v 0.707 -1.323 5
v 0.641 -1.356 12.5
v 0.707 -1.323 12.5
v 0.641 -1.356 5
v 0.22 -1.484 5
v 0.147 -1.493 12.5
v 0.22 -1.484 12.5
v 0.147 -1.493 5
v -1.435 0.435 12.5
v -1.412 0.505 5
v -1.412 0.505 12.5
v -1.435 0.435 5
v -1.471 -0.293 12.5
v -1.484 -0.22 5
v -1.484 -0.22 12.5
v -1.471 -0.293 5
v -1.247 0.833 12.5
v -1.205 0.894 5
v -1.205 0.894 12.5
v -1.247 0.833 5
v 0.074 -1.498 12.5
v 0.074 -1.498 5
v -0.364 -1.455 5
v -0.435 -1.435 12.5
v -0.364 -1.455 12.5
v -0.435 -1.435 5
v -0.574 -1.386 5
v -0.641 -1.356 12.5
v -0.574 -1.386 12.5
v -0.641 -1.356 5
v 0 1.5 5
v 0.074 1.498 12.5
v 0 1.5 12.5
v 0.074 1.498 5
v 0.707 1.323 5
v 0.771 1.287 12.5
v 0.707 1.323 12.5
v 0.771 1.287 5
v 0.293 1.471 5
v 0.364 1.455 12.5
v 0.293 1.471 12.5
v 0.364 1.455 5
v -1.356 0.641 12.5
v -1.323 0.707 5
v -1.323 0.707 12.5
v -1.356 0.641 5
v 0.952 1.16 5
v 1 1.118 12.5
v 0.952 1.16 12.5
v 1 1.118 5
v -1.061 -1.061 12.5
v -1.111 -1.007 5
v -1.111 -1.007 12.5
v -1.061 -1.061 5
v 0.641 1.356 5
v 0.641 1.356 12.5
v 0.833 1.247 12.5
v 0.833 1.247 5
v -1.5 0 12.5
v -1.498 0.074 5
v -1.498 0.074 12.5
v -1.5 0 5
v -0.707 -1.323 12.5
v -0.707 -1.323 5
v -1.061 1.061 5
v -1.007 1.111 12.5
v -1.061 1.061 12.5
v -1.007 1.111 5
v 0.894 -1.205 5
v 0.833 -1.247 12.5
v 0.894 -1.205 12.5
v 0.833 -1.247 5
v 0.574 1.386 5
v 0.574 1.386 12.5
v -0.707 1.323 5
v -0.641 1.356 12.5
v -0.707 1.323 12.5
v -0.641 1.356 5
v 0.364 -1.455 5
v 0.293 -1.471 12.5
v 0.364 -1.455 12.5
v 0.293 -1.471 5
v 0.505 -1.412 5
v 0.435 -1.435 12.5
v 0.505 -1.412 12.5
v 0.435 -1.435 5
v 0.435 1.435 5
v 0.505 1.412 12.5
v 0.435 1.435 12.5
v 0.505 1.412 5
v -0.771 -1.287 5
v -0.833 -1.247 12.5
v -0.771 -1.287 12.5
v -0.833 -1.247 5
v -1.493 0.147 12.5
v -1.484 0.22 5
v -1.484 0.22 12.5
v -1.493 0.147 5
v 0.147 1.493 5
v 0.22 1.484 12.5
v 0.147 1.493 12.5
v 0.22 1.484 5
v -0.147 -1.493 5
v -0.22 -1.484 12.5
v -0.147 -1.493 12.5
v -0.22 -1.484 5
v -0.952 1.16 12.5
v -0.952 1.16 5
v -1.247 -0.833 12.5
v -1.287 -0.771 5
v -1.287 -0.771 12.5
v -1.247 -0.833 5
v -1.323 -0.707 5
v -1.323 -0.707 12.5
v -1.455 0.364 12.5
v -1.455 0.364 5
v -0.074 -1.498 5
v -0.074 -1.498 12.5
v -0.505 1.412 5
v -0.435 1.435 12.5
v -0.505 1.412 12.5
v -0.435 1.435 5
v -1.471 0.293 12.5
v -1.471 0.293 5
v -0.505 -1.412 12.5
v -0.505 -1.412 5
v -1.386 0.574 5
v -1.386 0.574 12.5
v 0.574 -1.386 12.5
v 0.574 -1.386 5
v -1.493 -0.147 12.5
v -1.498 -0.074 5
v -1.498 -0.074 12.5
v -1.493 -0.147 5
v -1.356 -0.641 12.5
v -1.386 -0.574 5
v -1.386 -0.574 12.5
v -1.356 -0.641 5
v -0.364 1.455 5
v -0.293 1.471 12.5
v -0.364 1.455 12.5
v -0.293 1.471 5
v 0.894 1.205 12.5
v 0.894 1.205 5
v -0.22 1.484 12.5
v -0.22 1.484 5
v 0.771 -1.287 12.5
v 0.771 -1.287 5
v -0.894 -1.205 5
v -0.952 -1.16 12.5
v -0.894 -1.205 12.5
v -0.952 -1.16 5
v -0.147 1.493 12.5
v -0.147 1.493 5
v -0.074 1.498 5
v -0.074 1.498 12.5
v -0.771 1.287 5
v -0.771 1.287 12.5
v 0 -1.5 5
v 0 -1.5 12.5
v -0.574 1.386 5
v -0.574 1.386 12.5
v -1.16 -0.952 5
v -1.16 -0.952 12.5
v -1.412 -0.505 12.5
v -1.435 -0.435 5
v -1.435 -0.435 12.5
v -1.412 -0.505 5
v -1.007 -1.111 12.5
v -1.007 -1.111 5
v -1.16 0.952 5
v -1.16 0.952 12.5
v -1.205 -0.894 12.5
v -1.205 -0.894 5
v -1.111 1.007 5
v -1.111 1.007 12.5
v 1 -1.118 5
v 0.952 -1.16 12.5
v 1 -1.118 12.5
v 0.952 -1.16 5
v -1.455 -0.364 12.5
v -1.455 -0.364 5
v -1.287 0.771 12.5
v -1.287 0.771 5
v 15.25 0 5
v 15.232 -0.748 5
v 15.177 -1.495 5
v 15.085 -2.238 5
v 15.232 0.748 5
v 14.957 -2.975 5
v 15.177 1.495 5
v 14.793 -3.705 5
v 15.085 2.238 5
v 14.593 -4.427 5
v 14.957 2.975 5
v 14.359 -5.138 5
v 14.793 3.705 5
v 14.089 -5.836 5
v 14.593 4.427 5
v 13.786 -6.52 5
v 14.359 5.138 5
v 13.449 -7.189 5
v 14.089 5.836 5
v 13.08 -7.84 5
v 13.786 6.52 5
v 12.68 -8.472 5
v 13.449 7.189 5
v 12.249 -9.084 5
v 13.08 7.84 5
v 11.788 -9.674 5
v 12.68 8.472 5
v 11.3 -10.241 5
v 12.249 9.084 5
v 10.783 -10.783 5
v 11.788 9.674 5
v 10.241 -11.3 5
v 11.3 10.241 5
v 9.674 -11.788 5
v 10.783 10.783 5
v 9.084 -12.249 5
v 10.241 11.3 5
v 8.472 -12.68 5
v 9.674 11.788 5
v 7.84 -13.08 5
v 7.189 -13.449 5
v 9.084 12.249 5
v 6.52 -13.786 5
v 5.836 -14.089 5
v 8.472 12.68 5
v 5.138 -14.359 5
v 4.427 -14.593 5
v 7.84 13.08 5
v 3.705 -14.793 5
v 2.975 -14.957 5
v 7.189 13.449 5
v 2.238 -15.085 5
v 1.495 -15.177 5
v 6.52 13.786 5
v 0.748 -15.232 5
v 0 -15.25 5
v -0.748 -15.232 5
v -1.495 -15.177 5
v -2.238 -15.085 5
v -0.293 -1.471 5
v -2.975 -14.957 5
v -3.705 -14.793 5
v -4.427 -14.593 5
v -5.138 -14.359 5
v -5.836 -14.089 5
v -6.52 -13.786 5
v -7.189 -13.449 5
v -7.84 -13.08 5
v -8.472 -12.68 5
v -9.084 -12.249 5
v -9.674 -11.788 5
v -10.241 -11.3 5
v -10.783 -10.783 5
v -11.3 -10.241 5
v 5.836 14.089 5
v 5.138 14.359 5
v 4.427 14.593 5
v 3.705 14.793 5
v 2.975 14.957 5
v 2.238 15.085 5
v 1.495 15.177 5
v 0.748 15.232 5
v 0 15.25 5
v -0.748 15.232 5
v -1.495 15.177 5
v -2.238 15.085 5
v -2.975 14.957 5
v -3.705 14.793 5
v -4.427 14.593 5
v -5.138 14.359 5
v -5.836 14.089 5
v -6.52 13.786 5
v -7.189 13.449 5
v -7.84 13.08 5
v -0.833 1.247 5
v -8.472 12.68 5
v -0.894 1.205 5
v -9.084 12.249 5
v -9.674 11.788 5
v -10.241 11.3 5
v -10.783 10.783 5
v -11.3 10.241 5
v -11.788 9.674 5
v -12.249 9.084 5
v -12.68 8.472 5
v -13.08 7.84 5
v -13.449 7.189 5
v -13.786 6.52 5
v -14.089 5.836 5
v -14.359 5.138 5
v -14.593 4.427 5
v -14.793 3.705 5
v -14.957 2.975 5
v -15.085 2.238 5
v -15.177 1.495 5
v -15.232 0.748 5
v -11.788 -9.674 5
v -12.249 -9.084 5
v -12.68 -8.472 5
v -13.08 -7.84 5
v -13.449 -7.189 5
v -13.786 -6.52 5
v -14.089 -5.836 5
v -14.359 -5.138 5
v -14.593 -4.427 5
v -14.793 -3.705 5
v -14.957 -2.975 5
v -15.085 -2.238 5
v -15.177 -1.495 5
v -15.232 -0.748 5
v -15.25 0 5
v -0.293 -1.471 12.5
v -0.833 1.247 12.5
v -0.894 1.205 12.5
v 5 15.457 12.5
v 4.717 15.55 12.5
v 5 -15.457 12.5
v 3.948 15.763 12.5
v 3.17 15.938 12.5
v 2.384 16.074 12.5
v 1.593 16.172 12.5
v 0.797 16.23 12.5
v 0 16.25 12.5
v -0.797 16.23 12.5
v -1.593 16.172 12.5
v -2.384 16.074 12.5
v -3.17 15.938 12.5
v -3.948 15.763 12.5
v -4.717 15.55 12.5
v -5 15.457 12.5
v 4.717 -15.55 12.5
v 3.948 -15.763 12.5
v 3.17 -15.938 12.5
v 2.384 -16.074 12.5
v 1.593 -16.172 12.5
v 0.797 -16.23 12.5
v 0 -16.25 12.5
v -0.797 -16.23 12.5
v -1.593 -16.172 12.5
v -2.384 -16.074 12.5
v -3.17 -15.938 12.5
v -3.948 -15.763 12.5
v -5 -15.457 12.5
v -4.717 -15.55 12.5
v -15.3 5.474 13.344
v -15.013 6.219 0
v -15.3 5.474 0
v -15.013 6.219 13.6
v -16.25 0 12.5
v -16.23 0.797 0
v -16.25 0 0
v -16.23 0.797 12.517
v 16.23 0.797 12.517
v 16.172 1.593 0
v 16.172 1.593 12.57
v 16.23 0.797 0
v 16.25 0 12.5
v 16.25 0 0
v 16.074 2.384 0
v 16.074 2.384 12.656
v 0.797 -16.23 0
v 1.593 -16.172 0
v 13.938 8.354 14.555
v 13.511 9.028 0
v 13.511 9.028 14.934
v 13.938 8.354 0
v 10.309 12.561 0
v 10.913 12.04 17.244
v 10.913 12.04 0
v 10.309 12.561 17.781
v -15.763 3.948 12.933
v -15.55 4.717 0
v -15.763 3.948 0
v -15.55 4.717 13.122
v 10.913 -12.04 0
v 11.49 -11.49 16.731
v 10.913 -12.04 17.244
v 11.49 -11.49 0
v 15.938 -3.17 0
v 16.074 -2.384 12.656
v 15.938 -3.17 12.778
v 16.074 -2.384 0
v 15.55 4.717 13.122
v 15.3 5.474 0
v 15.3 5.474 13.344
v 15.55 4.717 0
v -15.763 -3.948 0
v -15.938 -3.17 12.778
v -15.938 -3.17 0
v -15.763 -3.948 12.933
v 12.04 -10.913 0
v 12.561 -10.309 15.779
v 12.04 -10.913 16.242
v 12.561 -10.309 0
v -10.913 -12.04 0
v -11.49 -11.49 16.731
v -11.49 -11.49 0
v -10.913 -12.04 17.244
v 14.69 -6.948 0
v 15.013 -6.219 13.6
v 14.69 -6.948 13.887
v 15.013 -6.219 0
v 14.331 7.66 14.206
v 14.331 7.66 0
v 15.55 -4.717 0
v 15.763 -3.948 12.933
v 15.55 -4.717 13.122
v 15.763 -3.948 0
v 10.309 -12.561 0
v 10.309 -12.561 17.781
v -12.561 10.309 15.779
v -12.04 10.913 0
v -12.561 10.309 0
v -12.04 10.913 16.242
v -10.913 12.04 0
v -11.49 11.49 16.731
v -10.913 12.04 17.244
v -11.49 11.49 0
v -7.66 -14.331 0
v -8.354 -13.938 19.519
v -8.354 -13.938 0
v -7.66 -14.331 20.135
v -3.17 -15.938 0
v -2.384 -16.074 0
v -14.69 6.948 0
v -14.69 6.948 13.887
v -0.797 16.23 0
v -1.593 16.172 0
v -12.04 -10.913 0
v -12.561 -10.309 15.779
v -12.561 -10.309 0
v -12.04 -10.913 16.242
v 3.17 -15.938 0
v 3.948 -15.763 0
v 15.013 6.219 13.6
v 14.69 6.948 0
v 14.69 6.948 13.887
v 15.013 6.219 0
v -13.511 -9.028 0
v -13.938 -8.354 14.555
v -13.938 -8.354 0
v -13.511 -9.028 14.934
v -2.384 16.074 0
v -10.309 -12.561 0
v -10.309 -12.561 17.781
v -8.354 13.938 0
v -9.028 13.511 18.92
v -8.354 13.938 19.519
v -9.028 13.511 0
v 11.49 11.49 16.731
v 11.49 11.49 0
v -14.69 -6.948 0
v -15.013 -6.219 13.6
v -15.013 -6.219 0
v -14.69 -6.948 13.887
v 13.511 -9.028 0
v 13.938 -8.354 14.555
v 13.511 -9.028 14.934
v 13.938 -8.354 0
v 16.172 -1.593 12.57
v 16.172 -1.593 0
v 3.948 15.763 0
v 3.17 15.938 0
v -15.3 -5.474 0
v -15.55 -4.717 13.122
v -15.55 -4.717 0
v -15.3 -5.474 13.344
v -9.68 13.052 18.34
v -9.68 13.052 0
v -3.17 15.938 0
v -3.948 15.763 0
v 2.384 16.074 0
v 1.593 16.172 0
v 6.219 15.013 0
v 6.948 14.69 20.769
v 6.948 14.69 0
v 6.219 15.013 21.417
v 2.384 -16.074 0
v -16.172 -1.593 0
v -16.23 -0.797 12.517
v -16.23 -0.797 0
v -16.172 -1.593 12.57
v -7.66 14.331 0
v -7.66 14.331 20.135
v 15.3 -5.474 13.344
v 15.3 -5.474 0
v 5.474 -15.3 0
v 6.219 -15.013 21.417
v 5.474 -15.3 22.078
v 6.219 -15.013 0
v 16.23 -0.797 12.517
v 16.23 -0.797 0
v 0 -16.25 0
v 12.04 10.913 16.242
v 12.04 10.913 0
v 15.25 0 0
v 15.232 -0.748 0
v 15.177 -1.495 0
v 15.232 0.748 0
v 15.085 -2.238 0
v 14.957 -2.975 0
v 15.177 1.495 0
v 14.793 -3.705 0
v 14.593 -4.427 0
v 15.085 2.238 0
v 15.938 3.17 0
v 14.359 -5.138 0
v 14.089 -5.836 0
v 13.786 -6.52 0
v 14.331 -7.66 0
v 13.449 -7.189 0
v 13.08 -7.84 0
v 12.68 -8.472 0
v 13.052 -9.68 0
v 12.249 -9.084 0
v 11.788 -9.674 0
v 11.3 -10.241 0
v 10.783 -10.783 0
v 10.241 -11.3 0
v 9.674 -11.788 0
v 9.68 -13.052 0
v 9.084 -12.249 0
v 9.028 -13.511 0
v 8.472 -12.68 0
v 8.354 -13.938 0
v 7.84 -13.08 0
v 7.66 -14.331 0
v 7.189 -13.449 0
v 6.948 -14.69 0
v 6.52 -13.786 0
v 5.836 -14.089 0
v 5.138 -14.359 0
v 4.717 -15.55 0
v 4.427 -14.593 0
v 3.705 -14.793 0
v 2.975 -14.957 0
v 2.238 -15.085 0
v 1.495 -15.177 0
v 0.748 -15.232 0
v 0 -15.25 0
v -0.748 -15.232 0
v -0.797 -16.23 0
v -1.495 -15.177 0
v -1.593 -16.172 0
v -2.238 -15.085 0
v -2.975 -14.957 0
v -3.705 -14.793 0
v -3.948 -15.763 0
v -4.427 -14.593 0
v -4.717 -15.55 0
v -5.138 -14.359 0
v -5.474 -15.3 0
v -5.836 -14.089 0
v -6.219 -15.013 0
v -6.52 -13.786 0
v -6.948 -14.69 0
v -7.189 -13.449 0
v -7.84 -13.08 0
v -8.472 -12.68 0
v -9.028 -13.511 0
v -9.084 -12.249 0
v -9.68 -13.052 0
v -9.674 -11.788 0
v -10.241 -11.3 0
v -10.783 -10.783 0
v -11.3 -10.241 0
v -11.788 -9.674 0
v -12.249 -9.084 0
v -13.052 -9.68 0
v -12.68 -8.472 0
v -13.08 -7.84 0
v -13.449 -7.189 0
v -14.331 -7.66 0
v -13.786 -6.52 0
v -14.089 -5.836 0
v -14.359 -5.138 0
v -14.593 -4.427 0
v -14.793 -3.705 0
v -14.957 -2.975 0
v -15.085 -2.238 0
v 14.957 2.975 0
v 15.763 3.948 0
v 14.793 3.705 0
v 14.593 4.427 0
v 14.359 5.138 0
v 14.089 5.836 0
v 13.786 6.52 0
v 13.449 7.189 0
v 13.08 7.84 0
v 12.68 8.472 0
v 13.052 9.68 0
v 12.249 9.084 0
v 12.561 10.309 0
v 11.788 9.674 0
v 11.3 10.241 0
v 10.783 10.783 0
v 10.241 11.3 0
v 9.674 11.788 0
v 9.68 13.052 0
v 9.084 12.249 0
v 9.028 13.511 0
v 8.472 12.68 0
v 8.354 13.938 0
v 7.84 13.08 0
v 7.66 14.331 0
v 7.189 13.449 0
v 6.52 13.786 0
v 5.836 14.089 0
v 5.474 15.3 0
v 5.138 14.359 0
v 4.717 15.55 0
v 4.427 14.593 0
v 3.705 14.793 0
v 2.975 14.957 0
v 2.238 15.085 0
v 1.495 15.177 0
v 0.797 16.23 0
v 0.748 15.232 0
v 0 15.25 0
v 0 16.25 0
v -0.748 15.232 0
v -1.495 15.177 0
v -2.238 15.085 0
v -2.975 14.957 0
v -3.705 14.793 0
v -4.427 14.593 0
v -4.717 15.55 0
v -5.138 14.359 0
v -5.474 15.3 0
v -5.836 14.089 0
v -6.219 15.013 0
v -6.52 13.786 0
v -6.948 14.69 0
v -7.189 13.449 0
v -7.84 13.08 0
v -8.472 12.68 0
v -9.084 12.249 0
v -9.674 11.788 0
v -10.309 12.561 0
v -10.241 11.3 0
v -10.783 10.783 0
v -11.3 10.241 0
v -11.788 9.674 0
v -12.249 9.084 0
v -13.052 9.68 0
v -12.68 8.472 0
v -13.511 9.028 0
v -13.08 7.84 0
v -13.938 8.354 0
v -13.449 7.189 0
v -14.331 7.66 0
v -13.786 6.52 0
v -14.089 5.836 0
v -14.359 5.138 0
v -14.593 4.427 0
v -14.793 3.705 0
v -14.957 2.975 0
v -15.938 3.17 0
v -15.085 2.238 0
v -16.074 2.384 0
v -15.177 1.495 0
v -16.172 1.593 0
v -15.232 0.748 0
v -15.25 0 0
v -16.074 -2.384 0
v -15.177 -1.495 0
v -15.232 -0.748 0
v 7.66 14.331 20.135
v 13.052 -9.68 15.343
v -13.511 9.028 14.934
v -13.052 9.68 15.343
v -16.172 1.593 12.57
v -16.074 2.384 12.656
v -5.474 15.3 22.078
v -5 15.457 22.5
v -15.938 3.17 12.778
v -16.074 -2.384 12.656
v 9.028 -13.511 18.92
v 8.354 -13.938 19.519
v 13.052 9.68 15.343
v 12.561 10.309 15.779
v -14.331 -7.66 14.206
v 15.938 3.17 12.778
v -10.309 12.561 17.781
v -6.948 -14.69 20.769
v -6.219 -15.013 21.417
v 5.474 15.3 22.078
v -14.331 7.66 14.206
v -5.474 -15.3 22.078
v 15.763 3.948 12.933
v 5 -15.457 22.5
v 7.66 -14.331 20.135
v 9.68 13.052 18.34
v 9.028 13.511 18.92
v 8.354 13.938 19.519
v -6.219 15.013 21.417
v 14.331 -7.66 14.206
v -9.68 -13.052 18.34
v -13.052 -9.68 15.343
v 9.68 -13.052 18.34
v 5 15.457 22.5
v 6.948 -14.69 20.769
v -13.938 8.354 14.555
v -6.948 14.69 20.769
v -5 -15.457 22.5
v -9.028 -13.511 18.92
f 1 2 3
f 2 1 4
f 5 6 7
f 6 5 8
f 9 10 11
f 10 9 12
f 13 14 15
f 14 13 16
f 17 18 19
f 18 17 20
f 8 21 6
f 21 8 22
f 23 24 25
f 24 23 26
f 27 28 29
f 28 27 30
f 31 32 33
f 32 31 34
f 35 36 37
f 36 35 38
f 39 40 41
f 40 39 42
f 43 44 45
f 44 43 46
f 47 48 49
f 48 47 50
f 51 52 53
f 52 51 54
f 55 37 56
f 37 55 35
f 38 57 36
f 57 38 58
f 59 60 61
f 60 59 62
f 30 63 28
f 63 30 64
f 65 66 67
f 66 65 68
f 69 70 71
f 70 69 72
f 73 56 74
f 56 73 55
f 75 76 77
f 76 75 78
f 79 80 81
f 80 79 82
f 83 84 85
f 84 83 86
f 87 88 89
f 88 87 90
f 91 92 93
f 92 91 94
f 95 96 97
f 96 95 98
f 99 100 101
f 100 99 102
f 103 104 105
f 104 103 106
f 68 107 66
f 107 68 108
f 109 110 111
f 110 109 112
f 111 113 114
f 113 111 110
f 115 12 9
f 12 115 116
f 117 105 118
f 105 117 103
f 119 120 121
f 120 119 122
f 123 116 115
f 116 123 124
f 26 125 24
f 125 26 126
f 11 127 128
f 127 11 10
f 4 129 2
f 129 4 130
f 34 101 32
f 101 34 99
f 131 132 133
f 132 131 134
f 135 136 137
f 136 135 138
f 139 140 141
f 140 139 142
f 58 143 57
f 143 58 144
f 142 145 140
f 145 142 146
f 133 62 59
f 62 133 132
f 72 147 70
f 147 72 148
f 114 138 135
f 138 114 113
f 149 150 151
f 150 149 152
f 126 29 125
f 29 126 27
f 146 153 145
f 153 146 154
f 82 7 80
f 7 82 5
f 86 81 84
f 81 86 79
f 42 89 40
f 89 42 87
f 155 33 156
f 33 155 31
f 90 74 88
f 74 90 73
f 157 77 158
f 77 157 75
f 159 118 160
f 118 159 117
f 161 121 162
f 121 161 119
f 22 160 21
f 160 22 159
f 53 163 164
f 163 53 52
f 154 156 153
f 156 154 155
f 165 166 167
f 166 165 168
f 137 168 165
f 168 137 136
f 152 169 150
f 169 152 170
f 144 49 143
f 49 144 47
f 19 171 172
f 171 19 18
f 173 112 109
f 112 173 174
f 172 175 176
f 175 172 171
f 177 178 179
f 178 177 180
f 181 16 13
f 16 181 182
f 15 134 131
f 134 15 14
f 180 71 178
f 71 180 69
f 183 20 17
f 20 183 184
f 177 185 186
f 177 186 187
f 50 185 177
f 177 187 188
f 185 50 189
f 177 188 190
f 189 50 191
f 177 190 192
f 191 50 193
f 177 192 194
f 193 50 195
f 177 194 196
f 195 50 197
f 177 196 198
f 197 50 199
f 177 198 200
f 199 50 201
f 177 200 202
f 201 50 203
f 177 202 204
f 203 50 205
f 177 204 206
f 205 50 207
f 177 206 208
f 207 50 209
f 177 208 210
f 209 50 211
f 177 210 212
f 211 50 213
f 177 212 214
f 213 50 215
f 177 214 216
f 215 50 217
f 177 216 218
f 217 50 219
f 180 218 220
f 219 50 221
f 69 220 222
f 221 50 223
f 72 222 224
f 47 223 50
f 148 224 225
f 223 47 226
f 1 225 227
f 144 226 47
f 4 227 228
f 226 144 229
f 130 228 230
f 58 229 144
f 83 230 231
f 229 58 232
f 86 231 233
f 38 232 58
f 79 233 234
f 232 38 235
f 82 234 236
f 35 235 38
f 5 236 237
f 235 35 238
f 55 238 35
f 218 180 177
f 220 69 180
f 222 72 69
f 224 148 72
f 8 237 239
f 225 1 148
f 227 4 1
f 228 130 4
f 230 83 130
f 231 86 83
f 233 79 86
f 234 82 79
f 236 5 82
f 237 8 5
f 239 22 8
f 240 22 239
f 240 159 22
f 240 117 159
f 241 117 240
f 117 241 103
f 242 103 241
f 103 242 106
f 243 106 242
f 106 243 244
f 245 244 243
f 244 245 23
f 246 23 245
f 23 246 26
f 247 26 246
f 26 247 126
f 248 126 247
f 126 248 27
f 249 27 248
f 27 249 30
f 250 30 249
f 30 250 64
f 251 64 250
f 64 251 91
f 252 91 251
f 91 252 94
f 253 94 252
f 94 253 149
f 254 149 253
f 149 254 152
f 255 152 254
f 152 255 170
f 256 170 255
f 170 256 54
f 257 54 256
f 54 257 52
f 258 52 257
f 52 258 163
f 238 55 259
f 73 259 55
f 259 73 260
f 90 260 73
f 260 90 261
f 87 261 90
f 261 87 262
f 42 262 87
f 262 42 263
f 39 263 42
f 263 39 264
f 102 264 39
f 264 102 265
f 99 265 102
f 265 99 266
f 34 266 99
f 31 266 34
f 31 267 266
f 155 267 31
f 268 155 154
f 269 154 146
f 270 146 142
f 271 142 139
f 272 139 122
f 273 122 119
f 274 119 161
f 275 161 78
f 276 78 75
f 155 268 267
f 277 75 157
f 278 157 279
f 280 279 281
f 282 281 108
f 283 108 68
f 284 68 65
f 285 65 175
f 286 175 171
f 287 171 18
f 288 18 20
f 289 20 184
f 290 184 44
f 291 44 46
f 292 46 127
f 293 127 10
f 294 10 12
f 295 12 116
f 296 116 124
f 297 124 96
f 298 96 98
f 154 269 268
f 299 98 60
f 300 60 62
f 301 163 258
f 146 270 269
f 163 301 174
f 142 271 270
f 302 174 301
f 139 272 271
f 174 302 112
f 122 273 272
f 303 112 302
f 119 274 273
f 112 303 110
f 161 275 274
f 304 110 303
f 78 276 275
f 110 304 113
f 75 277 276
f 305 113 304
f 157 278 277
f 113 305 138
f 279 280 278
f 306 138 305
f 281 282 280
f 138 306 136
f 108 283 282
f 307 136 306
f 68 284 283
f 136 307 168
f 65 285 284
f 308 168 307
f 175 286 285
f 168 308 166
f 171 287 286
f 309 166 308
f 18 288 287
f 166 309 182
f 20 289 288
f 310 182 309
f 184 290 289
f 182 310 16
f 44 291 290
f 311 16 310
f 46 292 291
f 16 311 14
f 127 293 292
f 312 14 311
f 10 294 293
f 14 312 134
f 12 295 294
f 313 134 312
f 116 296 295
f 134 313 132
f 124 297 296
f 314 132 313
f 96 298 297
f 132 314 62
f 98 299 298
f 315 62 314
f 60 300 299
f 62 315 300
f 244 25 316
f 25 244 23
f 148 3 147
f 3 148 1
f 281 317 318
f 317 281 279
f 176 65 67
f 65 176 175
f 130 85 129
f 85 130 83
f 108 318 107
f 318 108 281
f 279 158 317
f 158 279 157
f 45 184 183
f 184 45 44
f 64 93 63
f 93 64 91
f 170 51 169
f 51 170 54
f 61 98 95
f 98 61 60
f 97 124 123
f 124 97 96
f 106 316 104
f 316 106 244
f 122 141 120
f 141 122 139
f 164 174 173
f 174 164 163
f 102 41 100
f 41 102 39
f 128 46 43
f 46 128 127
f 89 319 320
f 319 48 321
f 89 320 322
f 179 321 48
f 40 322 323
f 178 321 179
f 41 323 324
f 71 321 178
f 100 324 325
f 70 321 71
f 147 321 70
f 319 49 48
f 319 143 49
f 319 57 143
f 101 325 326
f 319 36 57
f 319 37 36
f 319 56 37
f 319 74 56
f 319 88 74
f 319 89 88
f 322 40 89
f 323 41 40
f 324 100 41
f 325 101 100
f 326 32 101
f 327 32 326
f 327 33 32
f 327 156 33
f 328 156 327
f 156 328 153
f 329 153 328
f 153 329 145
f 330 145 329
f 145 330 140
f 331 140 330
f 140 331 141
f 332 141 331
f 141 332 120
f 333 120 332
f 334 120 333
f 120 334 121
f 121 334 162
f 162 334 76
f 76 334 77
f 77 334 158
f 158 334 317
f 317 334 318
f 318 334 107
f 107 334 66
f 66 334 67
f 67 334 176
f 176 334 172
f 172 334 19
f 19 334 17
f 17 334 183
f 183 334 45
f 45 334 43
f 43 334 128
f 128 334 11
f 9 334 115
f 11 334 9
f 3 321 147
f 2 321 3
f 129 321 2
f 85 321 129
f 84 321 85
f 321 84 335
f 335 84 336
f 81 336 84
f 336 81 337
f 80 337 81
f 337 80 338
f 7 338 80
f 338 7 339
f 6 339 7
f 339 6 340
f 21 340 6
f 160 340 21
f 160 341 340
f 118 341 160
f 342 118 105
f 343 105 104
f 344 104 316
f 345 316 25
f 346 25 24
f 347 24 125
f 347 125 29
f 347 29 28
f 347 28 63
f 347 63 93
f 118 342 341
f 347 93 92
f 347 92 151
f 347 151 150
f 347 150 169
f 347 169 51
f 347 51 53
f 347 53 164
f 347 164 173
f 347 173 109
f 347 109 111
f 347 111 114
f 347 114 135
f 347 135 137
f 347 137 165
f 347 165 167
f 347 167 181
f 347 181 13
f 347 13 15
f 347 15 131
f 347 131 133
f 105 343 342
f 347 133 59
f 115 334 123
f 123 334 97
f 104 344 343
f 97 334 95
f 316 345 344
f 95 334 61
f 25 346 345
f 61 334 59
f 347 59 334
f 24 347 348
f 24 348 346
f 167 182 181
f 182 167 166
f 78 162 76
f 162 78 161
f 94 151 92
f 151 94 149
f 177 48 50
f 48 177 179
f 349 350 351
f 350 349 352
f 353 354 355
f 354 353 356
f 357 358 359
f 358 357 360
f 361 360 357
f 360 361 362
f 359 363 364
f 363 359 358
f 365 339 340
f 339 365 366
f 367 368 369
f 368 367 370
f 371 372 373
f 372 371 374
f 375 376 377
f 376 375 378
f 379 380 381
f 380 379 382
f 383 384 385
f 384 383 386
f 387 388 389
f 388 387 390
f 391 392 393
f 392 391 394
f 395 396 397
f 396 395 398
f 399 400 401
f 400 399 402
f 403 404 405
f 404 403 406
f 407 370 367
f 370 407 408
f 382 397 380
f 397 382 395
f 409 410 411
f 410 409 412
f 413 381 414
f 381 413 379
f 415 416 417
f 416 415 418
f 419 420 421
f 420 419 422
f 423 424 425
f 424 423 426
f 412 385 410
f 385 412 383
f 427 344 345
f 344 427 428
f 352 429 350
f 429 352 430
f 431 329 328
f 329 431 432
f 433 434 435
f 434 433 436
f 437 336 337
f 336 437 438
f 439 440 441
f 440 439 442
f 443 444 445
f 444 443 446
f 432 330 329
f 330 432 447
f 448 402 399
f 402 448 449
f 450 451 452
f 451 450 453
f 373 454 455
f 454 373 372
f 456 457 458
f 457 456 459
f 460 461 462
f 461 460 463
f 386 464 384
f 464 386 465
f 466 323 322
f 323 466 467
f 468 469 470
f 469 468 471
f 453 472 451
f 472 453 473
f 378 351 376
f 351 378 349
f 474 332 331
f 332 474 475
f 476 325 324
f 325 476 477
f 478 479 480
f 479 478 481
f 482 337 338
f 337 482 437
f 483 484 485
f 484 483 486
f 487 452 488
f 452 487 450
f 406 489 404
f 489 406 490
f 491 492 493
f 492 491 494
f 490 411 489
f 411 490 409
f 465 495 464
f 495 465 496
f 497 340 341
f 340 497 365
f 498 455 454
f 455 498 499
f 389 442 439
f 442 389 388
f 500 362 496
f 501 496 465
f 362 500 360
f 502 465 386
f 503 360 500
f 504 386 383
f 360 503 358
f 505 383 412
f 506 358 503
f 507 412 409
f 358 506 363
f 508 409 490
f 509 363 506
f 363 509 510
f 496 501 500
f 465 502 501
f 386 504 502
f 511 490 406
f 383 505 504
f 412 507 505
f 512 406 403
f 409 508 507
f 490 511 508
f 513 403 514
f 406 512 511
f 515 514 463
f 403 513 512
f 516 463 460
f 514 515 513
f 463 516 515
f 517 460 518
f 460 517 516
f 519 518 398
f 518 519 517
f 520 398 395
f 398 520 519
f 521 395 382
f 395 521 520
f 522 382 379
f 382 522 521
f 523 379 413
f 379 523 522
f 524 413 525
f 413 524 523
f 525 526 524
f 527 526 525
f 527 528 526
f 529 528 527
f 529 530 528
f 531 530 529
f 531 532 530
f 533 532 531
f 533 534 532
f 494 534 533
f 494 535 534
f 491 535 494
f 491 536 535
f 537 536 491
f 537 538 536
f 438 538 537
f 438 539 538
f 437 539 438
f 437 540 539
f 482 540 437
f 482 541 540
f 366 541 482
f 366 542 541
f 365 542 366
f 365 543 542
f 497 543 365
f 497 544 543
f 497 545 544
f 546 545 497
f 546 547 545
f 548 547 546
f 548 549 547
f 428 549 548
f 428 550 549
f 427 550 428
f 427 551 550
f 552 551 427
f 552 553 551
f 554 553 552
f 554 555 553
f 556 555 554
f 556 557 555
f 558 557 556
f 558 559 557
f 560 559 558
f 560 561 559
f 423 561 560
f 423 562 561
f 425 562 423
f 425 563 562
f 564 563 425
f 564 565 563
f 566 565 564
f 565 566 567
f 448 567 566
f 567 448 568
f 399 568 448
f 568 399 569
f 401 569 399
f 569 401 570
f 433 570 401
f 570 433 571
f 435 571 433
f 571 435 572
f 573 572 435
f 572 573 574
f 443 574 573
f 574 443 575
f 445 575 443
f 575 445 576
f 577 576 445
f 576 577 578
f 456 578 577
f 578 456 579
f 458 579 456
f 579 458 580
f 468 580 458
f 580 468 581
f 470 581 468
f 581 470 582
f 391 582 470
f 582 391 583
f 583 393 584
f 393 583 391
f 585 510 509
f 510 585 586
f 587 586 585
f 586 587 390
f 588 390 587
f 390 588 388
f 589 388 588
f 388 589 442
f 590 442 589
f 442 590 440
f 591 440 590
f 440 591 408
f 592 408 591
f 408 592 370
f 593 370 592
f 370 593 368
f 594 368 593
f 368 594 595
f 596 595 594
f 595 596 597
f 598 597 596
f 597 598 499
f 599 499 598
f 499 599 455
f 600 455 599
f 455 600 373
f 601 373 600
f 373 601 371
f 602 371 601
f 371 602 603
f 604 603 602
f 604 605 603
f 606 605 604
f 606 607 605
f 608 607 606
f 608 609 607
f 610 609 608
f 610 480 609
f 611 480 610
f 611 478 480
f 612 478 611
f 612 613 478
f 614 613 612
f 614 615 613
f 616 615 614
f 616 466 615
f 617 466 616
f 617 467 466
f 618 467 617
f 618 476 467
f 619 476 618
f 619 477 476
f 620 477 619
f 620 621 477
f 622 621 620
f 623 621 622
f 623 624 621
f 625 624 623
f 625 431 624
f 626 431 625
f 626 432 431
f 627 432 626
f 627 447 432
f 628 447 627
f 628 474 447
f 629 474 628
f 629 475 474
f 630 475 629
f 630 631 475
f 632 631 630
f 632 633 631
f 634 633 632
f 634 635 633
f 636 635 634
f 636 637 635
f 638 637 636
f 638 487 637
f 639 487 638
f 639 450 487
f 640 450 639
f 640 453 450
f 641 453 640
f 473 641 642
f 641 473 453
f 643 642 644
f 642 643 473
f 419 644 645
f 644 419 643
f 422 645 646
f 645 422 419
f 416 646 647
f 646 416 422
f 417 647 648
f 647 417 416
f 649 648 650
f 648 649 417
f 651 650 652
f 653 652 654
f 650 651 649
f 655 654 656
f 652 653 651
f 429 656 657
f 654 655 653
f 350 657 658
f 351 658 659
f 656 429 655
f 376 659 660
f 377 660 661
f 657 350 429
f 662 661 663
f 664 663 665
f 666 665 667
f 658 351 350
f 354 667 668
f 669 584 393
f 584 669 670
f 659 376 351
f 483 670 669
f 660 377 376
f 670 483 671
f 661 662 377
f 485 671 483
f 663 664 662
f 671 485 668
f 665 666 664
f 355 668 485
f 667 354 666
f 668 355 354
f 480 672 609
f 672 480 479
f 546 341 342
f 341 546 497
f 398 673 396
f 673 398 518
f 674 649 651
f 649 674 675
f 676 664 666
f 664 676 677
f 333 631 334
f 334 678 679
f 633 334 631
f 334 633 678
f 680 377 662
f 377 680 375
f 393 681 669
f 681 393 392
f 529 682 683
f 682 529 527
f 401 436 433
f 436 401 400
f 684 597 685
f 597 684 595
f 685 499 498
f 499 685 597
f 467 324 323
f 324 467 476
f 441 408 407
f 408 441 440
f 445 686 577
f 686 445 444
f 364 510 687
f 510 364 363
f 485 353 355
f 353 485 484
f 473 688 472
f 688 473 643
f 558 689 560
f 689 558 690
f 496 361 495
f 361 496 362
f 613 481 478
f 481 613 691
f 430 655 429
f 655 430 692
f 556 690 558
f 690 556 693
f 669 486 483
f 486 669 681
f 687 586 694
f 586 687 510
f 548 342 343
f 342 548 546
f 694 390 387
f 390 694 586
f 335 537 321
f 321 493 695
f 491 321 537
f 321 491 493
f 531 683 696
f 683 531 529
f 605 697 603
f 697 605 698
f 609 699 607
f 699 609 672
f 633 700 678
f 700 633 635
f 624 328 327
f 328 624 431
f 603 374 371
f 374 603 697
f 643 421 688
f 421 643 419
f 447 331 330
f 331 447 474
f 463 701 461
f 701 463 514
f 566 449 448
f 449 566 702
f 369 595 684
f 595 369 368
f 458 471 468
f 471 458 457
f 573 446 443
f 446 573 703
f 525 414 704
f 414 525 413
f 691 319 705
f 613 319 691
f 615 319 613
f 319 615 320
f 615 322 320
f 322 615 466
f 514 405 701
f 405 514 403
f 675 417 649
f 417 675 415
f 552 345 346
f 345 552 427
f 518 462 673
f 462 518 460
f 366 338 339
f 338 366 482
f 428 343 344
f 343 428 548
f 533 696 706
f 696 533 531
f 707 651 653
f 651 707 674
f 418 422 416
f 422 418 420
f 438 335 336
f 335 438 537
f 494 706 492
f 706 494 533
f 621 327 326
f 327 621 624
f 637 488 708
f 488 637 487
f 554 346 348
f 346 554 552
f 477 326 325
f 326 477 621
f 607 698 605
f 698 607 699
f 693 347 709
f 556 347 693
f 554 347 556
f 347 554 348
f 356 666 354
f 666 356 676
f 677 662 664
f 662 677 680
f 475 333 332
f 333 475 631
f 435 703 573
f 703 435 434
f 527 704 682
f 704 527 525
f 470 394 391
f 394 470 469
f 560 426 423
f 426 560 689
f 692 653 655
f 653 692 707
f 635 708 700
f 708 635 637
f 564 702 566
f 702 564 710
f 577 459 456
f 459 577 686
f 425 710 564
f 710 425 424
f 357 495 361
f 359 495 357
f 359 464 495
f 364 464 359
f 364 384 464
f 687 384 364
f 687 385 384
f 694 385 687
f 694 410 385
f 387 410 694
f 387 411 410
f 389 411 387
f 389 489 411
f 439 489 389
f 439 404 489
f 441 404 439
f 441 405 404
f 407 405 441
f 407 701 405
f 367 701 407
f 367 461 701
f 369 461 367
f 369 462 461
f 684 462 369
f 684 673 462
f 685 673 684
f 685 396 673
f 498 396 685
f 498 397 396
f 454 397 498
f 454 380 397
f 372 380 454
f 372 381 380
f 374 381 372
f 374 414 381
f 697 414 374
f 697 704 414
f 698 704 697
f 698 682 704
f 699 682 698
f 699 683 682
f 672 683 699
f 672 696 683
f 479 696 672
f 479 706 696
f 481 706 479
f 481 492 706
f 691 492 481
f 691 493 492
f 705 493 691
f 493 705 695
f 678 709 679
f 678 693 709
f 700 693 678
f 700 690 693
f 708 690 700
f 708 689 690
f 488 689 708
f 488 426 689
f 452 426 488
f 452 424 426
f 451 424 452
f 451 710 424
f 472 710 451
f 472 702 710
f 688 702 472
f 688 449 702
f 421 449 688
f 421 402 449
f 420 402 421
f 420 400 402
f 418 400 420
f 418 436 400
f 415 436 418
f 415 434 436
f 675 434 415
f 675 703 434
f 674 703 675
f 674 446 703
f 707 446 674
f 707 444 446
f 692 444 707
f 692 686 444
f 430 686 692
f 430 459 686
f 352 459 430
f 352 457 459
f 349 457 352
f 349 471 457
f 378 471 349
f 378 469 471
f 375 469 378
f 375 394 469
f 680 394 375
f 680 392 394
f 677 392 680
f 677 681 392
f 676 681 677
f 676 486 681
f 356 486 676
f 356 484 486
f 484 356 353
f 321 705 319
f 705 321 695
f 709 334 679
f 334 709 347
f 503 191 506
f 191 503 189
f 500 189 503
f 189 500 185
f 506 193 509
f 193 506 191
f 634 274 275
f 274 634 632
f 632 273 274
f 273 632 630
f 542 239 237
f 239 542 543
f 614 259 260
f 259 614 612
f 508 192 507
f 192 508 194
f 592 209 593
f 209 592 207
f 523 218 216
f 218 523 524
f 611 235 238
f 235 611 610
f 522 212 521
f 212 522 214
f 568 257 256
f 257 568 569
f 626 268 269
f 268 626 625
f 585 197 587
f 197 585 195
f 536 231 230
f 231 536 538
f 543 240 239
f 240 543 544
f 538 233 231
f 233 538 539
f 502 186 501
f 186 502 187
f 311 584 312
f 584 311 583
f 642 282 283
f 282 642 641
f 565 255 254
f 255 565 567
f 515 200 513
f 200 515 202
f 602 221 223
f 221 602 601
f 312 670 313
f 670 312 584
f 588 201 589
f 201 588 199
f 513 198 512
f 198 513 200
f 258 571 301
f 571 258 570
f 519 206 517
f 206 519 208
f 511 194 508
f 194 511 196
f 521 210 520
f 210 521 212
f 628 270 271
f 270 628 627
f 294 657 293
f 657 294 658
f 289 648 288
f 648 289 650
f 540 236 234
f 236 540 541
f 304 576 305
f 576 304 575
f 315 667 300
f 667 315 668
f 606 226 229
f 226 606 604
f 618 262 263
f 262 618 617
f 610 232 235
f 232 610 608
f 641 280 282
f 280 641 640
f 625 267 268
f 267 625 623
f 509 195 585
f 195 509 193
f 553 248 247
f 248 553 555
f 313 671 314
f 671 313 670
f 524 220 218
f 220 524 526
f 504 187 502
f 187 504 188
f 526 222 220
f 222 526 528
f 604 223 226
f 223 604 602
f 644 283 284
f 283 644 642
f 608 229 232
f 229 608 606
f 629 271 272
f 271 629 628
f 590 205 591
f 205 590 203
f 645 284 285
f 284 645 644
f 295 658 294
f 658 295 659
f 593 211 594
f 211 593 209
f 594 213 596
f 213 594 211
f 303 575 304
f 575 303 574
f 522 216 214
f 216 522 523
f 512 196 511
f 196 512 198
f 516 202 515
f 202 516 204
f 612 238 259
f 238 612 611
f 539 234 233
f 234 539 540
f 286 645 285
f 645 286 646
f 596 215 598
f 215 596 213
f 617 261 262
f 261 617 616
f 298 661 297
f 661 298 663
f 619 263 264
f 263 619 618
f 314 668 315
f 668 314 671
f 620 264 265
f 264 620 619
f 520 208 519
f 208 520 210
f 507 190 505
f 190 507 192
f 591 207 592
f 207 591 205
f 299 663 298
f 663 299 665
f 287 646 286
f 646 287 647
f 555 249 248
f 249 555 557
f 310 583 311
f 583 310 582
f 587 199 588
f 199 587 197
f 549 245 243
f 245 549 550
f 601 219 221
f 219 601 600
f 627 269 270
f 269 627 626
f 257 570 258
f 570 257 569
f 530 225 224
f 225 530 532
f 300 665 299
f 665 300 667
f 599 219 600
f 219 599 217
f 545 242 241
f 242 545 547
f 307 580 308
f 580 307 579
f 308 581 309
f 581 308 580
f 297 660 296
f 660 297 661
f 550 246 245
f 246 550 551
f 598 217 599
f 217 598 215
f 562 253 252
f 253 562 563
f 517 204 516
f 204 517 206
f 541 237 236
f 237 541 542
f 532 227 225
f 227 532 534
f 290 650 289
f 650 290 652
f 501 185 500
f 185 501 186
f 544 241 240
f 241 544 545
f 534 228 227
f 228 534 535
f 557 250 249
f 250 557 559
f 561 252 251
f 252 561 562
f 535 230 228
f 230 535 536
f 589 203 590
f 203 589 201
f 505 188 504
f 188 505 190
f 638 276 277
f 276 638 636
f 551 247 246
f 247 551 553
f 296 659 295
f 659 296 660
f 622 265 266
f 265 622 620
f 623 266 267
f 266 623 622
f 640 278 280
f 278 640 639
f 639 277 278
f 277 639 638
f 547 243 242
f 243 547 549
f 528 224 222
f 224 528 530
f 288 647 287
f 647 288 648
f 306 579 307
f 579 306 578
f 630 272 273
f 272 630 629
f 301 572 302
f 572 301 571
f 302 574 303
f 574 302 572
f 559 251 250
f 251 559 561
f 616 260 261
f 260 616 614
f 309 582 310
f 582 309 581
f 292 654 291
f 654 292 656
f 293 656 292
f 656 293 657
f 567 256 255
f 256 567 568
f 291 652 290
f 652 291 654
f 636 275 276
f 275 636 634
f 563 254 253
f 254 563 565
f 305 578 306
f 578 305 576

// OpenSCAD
$fn=128;

ph = 10; // notch height
eh = 10; // notch width 
hd = 32.5; // inner dia
thh = 5; // inner height
ah = 7.5; // motor axle height
ad = 3; // axle dia
wt = 1; // wall thickness
totalh = ph + ah + thh;

difference() {
    translate([0, 0, thh]) difference() {
        translate([0,0, -thh]) color("#FF00FF") rotate([0, 0, 0]) cylinder(totalh, d=hd);
        translate([0, hd/2, ah]) rotate([90, 0, 0]) linear_extrude(height=hd) polygon([[hd/2, 0], [hd/2, ph], [eh/2, ph]]);
        translate([0, hd/2, ah]) rotate([90, 0, 0]) linear_extrude(height=hd) polygon([[-hd/2, 0], [-hd/2, ph], [-eh/2, ph]]);
        translate([-eh / 2,-hd / 2, ah]) cube([eh, hd, eh]);
        difference() {
            cylinder(ah, d=ad);
            translate([ad/2  - 0.5, -ad, 0]) cube([0.5, ad * 2, ah]);
        }
    }
    translate([0,0,0]) color("blue") rotate([0, 0, 0]) cylinder(thh, d=hd-wt*2);
}
